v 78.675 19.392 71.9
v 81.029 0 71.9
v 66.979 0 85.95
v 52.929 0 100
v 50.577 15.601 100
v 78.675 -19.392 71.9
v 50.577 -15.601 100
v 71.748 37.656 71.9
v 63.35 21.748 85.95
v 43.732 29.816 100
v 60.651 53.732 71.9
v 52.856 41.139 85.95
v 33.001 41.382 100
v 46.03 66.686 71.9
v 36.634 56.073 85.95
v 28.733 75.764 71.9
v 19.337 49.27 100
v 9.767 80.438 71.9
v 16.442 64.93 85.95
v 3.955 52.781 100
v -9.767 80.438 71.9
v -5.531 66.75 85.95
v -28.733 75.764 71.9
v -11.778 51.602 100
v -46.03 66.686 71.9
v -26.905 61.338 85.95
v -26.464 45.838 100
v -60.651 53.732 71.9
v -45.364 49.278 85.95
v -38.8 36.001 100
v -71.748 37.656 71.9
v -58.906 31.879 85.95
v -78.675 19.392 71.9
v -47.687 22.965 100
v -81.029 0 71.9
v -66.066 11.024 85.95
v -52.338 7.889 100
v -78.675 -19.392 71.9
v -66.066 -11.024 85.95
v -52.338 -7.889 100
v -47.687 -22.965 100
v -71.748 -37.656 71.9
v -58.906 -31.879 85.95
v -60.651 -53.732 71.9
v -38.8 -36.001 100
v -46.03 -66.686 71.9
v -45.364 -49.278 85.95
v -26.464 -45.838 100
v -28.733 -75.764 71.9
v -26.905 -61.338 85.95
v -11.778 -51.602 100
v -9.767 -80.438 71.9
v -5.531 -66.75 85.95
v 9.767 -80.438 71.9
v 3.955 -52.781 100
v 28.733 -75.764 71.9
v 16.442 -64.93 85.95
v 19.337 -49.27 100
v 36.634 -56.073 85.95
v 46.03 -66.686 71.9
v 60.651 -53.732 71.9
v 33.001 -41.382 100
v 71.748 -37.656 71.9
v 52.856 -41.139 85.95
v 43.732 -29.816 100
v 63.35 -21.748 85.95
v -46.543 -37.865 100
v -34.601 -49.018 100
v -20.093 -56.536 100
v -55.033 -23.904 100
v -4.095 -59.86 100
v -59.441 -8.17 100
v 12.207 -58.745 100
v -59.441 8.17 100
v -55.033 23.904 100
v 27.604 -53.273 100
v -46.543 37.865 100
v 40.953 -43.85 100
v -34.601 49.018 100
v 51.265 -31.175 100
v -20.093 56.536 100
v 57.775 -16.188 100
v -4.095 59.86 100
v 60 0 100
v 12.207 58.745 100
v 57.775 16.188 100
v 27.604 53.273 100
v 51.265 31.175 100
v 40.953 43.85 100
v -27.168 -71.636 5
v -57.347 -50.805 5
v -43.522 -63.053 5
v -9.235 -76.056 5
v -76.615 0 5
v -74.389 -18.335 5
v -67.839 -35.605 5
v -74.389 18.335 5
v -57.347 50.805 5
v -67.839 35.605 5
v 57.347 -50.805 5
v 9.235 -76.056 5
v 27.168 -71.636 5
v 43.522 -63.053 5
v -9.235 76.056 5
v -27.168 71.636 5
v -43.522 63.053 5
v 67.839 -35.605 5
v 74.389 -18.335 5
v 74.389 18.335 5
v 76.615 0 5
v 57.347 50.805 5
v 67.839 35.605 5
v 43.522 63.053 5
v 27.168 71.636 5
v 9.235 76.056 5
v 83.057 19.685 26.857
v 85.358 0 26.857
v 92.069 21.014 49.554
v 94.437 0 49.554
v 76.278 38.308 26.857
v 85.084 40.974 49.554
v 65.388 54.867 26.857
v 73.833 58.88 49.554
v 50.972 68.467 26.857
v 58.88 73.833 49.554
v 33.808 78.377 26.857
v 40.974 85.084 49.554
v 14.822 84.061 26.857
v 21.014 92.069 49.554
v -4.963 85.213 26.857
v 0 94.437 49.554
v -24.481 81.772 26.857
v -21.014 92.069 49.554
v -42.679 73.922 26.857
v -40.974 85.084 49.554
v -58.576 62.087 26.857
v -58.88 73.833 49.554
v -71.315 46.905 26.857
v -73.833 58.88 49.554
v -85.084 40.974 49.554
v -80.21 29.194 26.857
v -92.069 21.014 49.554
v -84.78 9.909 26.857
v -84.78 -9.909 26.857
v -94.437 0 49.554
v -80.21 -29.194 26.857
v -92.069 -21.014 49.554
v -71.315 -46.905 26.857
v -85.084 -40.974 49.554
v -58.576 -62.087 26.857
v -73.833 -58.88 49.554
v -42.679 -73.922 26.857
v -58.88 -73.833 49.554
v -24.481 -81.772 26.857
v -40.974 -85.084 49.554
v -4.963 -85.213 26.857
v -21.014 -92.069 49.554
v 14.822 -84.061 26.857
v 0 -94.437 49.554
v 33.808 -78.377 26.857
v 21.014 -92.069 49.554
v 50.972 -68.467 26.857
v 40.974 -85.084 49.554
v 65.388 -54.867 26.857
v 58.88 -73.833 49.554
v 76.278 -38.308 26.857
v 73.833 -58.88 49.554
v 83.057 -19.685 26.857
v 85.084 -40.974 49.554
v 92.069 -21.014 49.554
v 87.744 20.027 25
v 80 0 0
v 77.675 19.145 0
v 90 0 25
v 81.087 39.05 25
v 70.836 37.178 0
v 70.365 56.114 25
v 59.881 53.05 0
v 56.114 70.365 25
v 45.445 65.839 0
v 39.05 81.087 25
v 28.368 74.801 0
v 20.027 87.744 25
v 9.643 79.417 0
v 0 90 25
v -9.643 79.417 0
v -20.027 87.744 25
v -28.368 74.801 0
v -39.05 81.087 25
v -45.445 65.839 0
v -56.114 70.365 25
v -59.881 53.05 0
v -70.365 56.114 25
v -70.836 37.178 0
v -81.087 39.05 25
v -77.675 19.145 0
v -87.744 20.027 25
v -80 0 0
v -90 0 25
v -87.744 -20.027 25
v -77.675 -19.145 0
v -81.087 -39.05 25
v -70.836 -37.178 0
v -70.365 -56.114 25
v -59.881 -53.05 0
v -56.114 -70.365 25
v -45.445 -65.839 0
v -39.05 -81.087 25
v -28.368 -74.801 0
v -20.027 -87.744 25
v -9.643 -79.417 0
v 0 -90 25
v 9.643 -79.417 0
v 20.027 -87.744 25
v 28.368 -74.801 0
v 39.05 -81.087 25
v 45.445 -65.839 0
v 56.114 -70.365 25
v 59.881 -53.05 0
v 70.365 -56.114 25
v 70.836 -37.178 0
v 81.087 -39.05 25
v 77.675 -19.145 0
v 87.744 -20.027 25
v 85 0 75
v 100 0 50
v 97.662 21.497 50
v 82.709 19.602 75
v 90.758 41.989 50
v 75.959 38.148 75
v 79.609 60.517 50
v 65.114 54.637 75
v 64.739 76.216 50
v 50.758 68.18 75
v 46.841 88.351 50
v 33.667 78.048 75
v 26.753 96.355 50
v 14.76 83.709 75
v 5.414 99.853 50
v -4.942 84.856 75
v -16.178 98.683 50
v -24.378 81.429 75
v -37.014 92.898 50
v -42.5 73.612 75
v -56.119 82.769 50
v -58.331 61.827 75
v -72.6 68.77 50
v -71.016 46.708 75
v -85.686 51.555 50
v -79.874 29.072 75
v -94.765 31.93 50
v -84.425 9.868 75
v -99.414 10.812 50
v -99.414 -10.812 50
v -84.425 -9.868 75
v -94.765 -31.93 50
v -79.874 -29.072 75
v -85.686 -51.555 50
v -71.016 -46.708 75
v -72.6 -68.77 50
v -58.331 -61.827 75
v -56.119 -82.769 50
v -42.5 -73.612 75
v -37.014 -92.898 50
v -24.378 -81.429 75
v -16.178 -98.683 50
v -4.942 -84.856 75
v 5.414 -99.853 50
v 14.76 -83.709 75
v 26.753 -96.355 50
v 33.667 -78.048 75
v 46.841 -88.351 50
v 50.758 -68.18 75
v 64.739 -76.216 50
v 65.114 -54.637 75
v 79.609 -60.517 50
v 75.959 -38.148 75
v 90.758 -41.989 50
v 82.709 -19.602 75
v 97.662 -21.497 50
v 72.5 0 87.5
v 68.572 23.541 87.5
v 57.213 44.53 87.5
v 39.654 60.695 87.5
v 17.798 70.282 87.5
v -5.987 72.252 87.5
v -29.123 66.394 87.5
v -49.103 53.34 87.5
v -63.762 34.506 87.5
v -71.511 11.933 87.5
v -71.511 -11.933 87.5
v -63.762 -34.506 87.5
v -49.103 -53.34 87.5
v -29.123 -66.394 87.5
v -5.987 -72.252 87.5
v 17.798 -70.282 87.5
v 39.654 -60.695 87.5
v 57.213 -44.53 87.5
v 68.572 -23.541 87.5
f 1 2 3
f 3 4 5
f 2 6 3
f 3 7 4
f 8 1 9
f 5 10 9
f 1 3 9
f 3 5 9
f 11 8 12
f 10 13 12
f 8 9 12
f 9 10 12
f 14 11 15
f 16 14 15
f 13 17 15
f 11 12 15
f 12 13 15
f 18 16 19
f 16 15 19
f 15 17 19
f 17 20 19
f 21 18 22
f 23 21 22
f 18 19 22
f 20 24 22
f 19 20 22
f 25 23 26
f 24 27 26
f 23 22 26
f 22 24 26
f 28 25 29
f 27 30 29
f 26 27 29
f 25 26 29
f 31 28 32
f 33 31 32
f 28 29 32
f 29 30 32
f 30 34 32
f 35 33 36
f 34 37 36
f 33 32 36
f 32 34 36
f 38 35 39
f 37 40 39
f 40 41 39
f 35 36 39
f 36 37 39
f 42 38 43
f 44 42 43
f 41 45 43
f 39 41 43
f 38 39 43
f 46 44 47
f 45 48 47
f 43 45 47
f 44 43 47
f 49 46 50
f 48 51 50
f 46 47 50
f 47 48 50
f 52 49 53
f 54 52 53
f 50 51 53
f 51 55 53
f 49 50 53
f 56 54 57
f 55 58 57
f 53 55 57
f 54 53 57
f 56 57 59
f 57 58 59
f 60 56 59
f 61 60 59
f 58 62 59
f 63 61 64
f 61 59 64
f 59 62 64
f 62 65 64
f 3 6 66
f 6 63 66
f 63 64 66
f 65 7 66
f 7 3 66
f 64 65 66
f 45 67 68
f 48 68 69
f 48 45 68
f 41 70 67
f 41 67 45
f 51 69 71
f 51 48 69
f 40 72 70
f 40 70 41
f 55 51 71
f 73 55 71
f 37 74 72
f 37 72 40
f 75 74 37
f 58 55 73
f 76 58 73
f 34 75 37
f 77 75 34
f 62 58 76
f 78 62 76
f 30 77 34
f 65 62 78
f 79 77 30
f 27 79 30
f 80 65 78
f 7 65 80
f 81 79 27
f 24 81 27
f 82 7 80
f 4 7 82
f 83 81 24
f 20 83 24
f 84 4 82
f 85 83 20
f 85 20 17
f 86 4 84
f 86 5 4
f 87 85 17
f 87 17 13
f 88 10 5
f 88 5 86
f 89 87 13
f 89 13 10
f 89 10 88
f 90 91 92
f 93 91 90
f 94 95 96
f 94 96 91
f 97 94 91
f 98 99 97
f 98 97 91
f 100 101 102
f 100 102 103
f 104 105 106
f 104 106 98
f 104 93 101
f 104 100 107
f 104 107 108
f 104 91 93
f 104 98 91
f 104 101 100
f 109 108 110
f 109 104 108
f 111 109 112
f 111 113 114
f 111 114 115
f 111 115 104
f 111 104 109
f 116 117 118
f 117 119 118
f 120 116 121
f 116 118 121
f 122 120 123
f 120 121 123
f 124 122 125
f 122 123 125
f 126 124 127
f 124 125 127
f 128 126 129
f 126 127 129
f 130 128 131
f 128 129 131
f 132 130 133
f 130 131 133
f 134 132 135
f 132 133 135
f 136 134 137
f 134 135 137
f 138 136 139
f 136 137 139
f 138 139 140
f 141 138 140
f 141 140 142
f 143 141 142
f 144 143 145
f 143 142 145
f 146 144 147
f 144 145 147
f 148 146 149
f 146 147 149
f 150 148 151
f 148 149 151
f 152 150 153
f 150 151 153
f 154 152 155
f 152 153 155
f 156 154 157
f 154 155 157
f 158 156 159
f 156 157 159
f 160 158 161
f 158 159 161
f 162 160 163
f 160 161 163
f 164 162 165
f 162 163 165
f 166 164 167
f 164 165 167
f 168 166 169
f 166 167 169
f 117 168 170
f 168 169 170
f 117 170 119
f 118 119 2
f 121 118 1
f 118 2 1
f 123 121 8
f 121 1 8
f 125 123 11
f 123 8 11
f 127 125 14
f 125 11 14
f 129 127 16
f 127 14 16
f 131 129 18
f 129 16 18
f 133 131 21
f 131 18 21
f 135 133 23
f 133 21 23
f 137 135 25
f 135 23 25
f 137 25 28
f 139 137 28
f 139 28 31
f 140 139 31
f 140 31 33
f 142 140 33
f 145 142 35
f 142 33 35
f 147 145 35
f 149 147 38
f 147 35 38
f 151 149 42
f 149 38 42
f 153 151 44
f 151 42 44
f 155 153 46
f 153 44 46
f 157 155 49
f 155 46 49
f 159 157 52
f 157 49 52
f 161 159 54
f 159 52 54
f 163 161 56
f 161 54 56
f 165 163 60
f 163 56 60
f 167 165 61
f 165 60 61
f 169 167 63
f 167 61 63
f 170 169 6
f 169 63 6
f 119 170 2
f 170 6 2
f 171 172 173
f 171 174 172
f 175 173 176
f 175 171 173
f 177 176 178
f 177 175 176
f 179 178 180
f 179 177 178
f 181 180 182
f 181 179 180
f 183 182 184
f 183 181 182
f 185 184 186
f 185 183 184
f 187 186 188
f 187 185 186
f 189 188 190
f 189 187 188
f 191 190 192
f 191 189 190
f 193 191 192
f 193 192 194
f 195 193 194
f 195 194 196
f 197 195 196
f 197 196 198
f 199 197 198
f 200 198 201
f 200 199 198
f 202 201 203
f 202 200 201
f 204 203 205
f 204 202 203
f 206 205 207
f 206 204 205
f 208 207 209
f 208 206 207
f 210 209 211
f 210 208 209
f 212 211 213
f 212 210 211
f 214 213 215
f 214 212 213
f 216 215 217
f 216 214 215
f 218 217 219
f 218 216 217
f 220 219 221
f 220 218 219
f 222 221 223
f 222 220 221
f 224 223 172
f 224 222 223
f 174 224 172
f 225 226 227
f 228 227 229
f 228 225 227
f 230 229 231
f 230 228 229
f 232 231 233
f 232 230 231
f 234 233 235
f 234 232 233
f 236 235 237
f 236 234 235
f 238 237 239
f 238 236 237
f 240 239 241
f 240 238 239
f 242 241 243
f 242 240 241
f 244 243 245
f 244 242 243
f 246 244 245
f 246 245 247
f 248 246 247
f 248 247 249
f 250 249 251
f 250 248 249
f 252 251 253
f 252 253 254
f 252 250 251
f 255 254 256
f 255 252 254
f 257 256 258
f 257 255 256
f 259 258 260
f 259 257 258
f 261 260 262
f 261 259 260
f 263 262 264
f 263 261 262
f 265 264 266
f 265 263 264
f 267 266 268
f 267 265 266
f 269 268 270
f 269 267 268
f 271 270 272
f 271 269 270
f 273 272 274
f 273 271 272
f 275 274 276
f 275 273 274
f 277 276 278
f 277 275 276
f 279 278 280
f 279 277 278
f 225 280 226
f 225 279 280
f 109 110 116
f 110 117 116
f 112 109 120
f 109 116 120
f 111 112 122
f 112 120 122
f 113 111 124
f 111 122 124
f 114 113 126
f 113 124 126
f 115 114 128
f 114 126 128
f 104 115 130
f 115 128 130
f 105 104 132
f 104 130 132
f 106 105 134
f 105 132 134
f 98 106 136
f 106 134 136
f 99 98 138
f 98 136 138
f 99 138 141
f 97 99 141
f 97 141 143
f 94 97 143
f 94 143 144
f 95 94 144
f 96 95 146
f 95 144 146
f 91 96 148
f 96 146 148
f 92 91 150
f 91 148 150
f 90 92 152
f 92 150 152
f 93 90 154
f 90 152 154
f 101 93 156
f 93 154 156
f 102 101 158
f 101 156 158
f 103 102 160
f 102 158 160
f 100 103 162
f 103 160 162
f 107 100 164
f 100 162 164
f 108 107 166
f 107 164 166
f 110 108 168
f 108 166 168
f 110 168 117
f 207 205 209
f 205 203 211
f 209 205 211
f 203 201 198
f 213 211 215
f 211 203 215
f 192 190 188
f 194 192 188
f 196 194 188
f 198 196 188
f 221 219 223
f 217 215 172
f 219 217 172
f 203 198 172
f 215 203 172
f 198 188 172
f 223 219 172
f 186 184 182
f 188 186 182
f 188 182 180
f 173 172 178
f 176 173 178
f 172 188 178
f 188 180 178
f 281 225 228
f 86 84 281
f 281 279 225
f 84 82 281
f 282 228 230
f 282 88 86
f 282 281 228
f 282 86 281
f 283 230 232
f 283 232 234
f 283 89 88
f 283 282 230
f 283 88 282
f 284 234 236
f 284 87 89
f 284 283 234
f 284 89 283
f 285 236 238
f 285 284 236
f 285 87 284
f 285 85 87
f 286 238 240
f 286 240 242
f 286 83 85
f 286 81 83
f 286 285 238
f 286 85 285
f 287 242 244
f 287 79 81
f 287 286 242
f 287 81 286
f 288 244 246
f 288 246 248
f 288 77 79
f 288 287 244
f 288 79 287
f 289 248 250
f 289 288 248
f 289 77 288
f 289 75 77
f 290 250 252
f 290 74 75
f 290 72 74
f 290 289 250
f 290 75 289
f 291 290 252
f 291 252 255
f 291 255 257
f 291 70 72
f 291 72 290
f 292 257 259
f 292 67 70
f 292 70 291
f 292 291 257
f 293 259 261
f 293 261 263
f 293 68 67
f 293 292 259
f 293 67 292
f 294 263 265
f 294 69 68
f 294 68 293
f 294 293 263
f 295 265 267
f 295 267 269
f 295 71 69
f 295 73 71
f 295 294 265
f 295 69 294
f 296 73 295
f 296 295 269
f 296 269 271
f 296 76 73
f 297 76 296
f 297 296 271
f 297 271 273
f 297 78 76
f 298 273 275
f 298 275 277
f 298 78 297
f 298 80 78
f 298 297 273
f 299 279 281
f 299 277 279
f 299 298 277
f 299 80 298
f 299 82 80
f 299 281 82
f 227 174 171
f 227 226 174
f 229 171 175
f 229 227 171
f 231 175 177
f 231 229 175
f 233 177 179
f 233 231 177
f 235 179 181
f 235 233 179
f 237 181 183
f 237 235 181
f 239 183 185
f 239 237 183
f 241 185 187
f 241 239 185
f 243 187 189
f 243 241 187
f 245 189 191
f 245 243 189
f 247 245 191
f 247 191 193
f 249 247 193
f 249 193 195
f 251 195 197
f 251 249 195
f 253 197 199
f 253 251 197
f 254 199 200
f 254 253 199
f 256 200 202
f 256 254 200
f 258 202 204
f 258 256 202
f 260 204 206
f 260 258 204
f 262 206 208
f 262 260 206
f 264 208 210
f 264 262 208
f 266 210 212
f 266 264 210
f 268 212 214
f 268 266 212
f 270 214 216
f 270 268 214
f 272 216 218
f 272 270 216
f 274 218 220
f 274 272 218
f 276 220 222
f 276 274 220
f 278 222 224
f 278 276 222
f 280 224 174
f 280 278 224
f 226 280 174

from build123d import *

# Parameters (mm, degrees)
F0_R      = 80
F2_R      = 90
F3_FACE_R = 90
F5_R      = 100
F6_FACE_R = 100
F8_R      = 85
F9_FACE_R = 85
F11_R     = 60
F13_T     = -5


with BuildPart() as f3:
    # F0 (on Top) → F3 section 0
    with BuildSketch(Plane.XY):
        Circle(F0_R)
    # F2 (on offset) → F3 section 1
    with BuildSketch(Plane.XY.offset(25)):
        Circle(F2_R)
    loft()

    # F3_face (on face) → F6 section 0
    with BuildSketch(Plane.XY.offset(25)):
        Circle(F3_FACE_R)
    # F5 (on offset) → F6 section 1
    with BuildSketch(Plane.XY.offset(50)):
        Circle(F5_R)
    loft()

    # F6_face (on face) → F9 section 0
    with BuildSketch(Plane.XY.offset(50)):
        Circle(F6_FACE_R)
    # F8 (on offset) → F9 section 1
    with BuildSketch(Plane.XY.offset(75)):
        Circle(F8_R)
    loft()

    # F9_face (on face) → F12 section 0
    with BuildSketch(Plane.XY.offset(75)):
        Circle(F9_FACE_R)
    # F11 (on offset) → F12 section 1
    with BuildSketch(Plane.XY.offset(100)):
        Circle(F11_R)
    loft()

    # F13
    f13_openings = [f3.faces().sort_by_distance(p)[0] for p in [
        (0, 0, 100),
    ]]
    offset(amount=F13_T, openings=f13_openings, kind=Kind.INTERSECTION)


solid = f3.part
